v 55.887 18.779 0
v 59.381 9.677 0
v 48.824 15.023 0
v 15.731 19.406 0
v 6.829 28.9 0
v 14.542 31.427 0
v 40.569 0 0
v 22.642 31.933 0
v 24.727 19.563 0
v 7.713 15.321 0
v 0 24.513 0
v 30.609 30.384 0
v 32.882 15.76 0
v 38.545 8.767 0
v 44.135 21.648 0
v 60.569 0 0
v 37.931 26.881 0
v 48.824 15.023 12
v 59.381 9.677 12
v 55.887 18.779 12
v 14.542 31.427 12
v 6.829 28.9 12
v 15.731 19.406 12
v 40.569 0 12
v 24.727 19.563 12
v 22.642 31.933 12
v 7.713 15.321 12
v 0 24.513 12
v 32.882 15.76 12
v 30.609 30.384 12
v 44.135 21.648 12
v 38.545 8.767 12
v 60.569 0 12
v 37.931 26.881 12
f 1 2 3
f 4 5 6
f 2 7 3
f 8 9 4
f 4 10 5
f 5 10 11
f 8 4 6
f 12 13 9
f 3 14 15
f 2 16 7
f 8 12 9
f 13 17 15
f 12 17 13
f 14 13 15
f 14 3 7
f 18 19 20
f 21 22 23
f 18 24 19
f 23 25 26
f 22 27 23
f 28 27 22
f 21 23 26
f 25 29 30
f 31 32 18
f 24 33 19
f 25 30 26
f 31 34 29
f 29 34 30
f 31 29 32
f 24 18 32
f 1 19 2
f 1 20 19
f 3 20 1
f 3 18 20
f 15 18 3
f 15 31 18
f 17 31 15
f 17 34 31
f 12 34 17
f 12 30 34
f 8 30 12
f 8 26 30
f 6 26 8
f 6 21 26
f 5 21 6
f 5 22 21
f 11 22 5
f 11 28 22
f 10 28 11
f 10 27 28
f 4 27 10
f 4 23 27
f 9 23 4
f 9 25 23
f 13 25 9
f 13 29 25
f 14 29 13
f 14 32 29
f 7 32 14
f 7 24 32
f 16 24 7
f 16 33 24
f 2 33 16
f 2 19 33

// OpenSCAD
$fn = 32;

// ----------------------------------------------------------------------
// Arc stop: segment, 12 mm thick
// ----------------------------------------------------------------------

// --- parameters (mm) ---
profile_height = 12;      // extrusion height
profile_points = 17;      // points of the closed outline

profile = [[60.569, 0], [59.381, 9.677], [55.887, 18.779], [48.824, 15.023], [44.135, 21.648], [37.931, 26.881], [30.609, 30.384], [22.642, 31.933], [14.542, 31.427], [6.829, 28.9], [0, 24.513], [7.713, 15.321], [15.731, 19.406], [24.727, 19.563], [32.882, 15.76], [38.545, 8.767], [40.569, 0]];  // single closed polygon, 17 points, counter clockwise

// --- the one profile operation ---
linear_extrude(height = profile_height) polygon(points = profile);
